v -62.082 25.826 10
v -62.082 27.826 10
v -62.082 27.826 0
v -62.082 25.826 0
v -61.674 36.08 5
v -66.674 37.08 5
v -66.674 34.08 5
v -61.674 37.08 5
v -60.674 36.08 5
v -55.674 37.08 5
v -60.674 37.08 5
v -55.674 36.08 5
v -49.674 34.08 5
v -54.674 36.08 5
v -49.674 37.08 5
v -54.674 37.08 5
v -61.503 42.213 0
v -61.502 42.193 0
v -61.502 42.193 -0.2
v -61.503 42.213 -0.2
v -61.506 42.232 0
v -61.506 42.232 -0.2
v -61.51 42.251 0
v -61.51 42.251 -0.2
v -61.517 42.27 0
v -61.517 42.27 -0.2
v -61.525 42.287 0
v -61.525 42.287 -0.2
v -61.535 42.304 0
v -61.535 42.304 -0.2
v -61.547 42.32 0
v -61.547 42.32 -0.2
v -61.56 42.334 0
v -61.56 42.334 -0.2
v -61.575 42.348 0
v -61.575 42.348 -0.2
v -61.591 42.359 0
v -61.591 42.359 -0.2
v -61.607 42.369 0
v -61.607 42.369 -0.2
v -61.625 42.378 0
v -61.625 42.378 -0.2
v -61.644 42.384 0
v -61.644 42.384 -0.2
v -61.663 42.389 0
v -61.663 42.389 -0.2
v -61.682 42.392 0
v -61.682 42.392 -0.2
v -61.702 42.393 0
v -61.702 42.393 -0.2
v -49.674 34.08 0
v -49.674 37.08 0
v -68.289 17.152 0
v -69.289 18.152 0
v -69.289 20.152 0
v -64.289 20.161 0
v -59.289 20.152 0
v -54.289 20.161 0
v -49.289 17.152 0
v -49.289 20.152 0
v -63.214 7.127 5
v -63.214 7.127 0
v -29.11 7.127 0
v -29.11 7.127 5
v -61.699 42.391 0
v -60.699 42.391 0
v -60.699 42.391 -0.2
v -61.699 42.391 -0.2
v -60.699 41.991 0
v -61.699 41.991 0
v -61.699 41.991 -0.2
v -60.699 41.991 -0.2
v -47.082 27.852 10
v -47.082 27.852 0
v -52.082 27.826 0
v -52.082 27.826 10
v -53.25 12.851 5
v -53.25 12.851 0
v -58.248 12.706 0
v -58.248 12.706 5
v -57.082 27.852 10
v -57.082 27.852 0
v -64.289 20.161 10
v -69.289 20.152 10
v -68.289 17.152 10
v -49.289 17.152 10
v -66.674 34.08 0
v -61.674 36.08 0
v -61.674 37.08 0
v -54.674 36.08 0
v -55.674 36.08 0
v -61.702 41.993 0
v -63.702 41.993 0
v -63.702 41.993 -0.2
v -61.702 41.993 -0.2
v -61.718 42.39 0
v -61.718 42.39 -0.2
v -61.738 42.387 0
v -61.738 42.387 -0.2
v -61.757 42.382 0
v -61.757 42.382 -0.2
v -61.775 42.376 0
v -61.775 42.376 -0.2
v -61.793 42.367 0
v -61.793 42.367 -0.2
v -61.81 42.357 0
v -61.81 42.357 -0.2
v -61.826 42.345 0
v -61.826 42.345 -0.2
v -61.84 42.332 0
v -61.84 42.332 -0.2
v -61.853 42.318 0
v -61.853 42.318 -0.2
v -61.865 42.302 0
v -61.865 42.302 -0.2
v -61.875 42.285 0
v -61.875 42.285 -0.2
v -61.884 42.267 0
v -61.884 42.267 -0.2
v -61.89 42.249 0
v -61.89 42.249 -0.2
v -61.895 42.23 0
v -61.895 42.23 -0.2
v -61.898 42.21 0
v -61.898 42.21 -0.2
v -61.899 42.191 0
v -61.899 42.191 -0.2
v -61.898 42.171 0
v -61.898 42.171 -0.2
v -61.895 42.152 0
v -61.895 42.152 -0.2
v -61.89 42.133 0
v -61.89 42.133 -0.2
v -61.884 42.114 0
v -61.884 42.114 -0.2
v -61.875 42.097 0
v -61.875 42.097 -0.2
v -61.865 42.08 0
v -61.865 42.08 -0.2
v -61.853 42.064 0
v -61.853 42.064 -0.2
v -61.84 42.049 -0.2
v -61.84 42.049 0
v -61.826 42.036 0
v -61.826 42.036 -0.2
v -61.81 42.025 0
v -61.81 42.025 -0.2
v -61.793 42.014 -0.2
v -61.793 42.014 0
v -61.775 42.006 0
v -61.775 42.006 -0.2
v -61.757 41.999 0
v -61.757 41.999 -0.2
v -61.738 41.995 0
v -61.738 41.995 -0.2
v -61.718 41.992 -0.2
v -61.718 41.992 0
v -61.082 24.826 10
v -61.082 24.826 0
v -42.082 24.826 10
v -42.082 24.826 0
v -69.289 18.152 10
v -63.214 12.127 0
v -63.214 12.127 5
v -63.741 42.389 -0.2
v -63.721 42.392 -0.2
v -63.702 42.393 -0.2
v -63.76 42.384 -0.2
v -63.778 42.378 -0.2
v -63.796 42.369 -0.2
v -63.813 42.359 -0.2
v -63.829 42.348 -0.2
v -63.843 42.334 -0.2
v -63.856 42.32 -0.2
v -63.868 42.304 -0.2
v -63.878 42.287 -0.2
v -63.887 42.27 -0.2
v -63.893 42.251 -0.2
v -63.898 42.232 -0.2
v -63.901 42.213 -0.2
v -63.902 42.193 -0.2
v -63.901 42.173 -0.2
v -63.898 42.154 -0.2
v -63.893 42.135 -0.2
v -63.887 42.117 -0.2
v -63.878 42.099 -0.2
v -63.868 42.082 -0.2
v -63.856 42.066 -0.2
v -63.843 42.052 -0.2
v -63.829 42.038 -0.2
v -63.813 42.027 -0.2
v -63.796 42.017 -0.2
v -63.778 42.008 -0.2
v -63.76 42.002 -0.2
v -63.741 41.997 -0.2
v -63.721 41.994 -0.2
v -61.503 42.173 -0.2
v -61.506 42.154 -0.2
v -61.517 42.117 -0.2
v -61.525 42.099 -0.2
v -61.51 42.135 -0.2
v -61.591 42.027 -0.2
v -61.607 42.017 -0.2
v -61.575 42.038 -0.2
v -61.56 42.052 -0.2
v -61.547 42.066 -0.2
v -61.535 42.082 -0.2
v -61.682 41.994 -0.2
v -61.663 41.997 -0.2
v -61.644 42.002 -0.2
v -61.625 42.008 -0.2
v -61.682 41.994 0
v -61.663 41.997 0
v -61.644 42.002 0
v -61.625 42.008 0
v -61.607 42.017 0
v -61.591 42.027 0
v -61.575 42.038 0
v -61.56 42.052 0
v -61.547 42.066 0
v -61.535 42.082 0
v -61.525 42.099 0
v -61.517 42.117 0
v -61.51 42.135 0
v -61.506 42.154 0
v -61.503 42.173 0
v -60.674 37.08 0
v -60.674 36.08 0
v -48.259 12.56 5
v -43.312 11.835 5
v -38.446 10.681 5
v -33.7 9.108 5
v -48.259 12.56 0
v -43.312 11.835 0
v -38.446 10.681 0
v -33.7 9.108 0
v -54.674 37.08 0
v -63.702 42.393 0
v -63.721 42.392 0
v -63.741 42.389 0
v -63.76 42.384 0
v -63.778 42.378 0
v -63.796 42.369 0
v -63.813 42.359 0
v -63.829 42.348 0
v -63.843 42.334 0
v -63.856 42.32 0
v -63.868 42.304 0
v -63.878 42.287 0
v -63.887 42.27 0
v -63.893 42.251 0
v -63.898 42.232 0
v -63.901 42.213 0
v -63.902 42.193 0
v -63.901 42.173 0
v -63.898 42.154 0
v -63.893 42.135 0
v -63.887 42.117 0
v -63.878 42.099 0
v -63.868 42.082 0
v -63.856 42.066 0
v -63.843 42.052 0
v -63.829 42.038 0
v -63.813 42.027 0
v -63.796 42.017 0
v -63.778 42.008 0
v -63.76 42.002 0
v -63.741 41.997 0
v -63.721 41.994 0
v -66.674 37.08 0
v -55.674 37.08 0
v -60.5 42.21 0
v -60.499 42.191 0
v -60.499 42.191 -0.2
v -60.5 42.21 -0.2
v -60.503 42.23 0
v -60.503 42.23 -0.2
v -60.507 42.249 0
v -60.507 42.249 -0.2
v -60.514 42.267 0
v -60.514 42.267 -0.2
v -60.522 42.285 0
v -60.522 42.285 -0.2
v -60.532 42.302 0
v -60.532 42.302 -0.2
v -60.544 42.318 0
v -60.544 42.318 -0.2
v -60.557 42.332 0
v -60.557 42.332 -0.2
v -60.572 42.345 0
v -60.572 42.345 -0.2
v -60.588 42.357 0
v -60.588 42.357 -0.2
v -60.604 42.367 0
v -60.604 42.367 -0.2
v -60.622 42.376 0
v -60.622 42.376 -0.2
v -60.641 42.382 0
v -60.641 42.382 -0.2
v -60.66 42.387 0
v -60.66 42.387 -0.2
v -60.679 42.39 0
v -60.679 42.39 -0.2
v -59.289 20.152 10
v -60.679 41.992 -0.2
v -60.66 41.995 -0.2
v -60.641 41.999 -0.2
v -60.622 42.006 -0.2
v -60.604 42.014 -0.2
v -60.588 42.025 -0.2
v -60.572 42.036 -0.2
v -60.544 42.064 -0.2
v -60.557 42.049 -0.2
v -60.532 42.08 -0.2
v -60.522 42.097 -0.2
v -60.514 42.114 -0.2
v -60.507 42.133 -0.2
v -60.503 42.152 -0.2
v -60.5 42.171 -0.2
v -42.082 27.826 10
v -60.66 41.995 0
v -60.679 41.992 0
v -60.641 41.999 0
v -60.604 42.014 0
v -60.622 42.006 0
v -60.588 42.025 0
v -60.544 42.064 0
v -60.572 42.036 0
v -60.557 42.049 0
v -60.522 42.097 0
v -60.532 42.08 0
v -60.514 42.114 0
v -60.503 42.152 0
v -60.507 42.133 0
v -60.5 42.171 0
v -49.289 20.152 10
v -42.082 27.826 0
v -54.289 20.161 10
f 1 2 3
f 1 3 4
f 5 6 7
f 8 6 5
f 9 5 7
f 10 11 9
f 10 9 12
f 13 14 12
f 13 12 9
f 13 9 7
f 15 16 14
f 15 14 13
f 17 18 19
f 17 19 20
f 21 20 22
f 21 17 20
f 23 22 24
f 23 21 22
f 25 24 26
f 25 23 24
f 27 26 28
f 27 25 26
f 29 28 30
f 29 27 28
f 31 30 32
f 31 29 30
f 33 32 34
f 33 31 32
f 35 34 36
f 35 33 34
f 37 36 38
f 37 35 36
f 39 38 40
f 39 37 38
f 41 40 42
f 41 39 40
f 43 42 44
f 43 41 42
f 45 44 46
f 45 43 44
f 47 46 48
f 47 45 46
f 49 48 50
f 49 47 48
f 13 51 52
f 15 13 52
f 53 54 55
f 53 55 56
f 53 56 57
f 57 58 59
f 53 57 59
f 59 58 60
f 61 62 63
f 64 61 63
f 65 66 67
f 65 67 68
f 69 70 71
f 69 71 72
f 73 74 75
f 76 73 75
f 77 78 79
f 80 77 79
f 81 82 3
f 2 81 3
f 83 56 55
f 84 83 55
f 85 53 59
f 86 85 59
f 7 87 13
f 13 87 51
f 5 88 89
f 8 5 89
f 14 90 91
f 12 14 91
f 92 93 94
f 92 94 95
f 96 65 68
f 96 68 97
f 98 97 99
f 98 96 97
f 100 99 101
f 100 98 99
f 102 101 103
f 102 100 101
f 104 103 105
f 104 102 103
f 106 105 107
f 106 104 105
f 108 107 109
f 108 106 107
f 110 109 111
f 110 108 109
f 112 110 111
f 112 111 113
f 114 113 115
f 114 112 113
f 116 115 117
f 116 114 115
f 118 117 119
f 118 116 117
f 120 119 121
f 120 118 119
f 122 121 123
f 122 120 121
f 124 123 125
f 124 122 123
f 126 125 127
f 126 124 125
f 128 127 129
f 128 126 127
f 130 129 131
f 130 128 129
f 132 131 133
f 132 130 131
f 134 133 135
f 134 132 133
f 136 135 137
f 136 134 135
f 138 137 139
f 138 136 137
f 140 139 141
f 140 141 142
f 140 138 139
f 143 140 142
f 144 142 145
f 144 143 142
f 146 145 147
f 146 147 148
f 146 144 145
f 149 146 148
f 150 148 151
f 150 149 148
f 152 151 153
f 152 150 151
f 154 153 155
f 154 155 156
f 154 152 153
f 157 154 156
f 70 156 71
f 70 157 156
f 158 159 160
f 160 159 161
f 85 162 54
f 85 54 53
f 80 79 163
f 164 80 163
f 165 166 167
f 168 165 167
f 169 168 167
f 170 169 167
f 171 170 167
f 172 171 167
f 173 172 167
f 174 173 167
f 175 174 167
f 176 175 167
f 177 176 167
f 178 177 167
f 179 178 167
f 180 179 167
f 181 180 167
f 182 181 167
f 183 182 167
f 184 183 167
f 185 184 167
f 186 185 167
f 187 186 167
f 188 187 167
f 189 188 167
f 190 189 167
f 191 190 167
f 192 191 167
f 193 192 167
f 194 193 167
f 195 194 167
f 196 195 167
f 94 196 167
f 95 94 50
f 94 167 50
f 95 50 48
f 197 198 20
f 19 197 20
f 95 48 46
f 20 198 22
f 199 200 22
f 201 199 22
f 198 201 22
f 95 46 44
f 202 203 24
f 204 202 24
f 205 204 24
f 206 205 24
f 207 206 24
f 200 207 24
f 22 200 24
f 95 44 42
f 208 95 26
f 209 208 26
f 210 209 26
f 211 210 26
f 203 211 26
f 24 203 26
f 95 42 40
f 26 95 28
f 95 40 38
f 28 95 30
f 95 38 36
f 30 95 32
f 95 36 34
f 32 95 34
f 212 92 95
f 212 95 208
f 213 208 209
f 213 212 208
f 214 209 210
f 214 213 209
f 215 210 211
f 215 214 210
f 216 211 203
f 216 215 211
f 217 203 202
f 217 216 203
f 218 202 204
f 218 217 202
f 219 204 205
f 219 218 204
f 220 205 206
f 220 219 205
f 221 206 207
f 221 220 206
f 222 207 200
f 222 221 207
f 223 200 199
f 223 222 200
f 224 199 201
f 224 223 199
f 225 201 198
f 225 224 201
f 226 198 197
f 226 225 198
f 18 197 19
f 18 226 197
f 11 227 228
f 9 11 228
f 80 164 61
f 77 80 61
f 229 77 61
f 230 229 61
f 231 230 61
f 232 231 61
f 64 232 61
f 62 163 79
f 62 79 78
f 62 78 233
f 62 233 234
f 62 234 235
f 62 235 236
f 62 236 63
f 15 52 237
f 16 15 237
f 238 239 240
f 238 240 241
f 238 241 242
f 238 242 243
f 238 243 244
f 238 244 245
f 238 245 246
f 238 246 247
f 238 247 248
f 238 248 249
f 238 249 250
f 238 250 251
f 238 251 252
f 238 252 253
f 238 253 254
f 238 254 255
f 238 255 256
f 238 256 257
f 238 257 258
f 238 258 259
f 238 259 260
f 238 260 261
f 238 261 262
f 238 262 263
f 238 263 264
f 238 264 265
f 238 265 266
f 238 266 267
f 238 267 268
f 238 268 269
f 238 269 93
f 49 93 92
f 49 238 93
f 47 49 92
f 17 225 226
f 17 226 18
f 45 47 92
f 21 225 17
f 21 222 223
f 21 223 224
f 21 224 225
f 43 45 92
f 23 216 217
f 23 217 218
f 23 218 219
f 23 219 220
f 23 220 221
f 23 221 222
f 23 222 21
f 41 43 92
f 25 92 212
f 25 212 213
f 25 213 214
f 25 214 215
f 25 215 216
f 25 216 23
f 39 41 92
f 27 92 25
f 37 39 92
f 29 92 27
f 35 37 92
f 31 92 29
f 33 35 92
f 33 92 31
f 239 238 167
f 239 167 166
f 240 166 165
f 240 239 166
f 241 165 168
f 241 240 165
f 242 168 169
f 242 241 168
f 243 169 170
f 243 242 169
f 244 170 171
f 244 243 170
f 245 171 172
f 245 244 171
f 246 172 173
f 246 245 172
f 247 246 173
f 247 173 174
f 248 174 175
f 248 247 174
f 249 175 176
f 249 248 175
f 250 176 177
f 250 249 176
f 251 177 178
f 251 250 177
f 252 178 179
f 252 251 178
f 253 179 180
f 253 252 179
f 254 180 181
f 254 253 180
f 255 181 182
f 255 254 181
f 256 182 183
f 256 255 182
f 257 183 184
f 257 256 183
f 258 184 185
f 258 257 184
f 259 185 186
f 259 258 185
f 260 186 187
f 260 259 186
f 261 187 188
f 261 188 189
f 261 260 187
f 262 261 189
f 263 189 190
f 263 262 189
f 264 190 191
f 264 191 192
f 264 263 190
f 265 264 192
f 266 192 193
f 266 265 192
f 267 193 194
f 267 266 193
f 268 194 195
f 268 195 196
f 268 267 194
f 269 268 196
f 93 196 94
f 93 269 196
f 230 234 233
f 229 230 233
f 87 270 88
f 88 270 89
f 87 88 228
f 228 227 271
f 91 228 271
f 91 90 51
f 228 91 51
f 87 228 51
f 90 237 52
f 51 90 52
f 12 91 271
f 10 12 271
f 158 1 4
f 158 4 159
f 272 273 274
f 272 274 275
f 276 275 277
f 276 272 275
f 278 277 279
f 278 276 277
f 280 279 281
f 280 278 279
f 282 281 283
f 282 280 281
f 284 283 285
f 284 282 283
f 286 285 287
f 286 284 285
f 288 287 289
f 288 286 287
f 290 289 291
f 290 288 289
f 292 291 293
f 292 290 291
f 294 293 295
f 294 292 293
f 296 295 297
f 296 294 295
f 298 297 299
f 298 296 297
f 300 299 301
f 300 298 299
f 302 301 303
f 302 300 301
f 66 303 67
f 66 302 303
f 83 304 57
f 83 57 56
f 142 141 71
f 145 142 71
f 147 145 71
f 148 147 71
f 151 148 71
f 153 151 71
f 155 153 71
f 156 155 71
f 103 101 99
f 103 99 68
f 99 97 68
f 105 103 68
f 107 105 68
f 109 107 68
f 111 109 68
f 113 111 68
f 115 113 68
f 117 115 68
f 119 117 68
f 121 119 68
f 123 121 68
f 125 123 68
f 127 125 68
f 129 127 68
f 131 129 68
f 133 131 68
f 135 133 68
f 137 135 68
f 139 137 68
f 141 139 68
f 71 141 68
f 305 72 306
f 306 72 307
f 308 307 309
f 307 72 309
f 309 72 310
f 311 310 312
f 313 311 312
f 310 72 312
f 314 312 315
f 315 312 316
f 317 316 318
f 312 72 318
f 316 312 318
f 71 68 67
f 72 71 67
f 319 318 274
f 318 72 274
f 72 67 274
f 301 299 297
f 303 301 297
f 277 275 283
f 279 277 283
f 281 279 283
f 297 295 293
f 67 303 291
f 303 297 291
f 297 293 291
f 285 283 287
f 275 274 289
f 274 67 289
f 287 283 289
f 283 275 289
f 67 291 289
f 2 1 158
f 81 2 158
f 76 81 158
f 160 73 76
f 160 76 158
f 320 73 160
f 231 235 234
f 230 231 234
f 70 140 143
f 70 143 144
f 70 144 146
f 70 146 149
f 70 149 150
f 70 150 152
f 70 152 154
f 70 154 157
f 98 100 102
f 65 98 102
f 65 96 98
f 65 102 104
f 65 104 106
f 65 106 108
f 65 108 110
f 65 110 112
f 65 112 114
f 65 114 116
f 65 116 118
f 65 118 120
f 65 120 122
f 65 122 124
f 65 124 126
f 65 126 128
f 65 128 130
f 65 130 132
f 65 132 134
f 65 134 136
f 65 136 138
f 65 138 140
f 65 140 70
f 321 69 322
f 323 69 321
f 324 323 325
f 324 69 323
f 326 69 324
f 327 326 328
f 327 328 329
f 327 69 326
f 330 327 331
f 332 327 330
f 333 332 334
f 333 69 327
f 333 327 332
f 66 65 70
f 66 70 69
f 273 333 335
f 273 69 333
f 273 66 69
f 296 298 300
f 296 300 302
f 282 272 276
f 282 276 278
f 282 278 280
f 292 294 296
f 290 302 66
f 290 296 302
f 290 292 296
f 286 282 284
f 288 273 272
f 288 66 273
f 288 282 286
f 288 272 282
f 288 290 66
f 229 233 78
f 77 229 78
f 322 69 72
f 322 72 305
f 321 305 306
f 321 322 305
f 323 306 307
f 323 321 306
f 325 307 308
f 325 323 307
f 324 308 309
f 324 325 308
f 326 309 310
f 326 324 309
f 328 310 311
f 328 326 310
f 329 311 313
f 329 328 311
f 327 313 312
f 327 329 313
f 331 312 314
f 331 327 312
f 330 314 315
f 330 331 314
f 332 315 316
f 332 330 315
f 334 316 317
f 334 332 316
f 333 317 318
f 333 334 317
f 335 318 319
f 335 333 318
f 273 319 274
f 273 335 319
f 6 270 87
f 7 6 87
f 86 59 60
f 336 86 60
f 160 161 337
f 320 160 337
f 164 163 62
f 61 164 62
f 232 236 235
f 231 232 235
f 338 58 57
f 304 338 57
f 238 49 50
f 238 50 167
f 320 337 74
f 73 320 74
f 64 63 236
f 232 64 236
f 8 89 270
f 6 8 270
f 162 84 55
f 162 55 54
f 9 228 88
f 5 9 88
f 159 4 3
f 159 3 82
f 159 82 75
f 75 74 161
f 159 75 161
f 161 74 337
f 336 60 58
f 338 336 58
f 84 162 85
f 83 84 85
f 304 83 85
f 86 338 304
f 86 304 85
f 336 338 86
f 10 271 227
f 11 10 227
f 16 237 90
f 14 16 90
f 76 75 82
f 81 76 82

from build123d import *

# Parameters (mm, degrees)
F1_DEPTH  = 0.2
F3_DEPTH  = 0.2
F5_DEPTH  = 5
F7_DEPTH  = 10
F9_DEPTH  = 10
F11_DEPTH = 5


# Not quite as in the source:
# - a feature names something its author has since deleted; it is built from what else it names


with BuildPart() as f1:
    # F0 (on Top) → F1 (new body)
    with BuildSketch(Plane.XY):
        with BuildLine():
            ThreePointArc((-63.7017709232, 41.993062175), (-63.560349567, 42.0516408187), (-63.5017709232, 42.193062175))
            ThreePointArc((-63.5017709232, 42.193062175), (-63.560349567, 42.3344835312), (-63.7017709232, 42.393062175))
            ThreePointArc((-63.7017709232, 42.393062175), (-63.9017709232, 42.193062175), (-63.7017709232, 41.993062175))
        make_face()
        with BuildLine():
            ThreePointArc((-63.7017709232, 42.393062175), (-63.560349567, 42.3344835312), (-63.5017709232, 42.193062175))
            ThreePointArc((-63.5017709232, 42.193062175), (-63.560349567, 42.0516408187), (-63.7017709232, 41.993062175))
            Line((-63.7017709232, 41.993062175), (-61.7017709232, 41.993062175))
            ThreePointArc((-61.7017709232, 41.993062175), (-61.9017709232, 42.193062175), (-61.7017709232, 42.393062175))
            Line((-61.7017709232, 42.393062175), (-63.7017709232, 42.393062175))
        make_face()
        with BuildLine():
            ThreePointArc((-61.5017709232, 42.193062175), (-61.560349567, 42.3344835312), (-61.7017709232, 42.393062175))
            ThreePointArc((-61.7017709232, 42.393062175), (-61.9017709232, 42.193062175), (-61.7017709232, 41.993062175))
            ThreePointArc((-61.7017709232, 41.993062175), (-61.560349567, 42.0516408187), (-61.5017709232, 42.193062175))
        make_face()
    extrude(amount=-F1_DEPTH)


with BuildPart() as f3:
    # F2 (on Top) → F3 (new body)
    with BuildSketch(Plane.XY):
        with BuildLine():
            ThreePointArc((-60.6987384856, 41.9908721328), (-60.5573171293, 42.0494507765), (-60.4987384856, 42.1908721328))
            ThreePointArc((-60.4987384856, 42.1908721328), (-60.5573171293, 42.332293489), (-60.6987384856, 42.3908721328))
            ThreePointArc((-60.6987384856, 42.3908721328), (-60.8987384856, 42.1908721328), (-60.6987384856, 41.9908721328))
        make_face()
        with BuildLine():
            ThreePointArc((-60.6987384856, 41.9908721328), (-60.8987384856, 42.1908721328), (-60.6987384856, 42.3908721328))
            Line((-60.6987384856, 42.3908721328), (-61.6987384856, 42.3908721328))
            ThreePointArc((-61.6987384856, 42.3908721328), (-61.5573171293, 42.332293489), (-61.4987384856, 42.1908721328))
            ThreePointArc((-61.4987384856, 42.1908721328), (-61.5573171293, 42.0494507765), (-61.6987384856, 41.9908721328))
            Line((-61.6987384856, 41.9908721328), (-60.6987384856, 41.9908721328))
        make_face()
        with BuildLine():
            ThreePointArc((-61.4987384856, 42.1908721328), (-61.5573171293, 42.332293489), (-61.6987384856, 42.3908721328))
            ThreePointArc((-61.6987384856, 42.3908721328), (-61.8987384856, 42.1908721328), (-61.6987384856, 41.9908721328))
            ThreePointArc((-61.6987384856, 41.9908721328), (-61.5573171293, 42.0494507765), (-61.4987384856, 42.1908721328))
        make_face()
    extrude(amount=-F3_DEPTH)


with BuildPart() as f5:
    # F4 (on Top) → F5 (new body)
    with BuildSketch(Plane.XY):
        Polygon((-61.6742311418, 37.0802673395), (-66.6742311418, 37.0802673395), (-66.6742311418, 34.0802673395), (-49.6742311418, 34.0802673395), (-49.6742311418, 37.0802673395), (-54.6742311418, 37.0802673395), (-54.6742311418, 36.0802673395), (-55.6742311418, 36.0802673395), (-55.6742311418, 37.0802673395), (-60.6742311418, 37.0802673395), (-60.6742311418, 36.0802673395), (-61.6742311418, 36.0802673395), align=None)
    extrude(amount=F5_DEPTH)


with BuildPart() as f7:
    # F6 (on Top) → F7 (new body)
    with BuildSketch(Plane.XY):
        Polygon((-57.0816621606, 27.8524017553), (-62.0815936218, 27.8262219362), (-62.0815936218, 25.8262219362), (-61.0815936218, 24.8262219362), (-42.0818677769, 24.8262219362), (-42.0818677769, 27.8262219362), (-47.0817992381, 27.8524017553), (-52.0817306994, 27.8262219362), align=None)
    extrude(amount=F7_DEPTH)


with BuildPart() as f9:
    # F8 (on Top) → F9 (new body)
    with BuildSketch(Plane.XY):
        Polygon((-64.2891405681, 20.1605834368), (-69.2891329527, 20.151856795), (-69.2891329527, 18.151856795), (-68.2891329527, 17.151856795), (-49.2891634144, 17.151856795), (-49.2891634144, 20.151856795), (-54.289155799, 20.1605834368), (-59.2891481836, 20.151856795), align=None)
    extrude(amount=F9_DEPTH)


with BuildPart() as f11:
    # F10 (on Top) → F11 (new body)
    with BuildSketch(Plane.XY):
        Polygon((-63.2143030609, 7.1265595207), (-29.1095899709, 7.1265595207), (-33.7004206177, 9.1075375551), (-38.4464353798, 10.6808601151), (-43.3115142192, 11.834553266), (-48.2586309483, 12.5598367065), (-53.2501350215, 12.8511905915), (-58.2480380791, 12.7063975421), (-63.2143030609, 12.1265595207), align=None)
    extrude(amount=F11_DEPTH)


solid = Compound([f1.part, f3.part, f5.part, f7.part, f9.part, f11.part])
